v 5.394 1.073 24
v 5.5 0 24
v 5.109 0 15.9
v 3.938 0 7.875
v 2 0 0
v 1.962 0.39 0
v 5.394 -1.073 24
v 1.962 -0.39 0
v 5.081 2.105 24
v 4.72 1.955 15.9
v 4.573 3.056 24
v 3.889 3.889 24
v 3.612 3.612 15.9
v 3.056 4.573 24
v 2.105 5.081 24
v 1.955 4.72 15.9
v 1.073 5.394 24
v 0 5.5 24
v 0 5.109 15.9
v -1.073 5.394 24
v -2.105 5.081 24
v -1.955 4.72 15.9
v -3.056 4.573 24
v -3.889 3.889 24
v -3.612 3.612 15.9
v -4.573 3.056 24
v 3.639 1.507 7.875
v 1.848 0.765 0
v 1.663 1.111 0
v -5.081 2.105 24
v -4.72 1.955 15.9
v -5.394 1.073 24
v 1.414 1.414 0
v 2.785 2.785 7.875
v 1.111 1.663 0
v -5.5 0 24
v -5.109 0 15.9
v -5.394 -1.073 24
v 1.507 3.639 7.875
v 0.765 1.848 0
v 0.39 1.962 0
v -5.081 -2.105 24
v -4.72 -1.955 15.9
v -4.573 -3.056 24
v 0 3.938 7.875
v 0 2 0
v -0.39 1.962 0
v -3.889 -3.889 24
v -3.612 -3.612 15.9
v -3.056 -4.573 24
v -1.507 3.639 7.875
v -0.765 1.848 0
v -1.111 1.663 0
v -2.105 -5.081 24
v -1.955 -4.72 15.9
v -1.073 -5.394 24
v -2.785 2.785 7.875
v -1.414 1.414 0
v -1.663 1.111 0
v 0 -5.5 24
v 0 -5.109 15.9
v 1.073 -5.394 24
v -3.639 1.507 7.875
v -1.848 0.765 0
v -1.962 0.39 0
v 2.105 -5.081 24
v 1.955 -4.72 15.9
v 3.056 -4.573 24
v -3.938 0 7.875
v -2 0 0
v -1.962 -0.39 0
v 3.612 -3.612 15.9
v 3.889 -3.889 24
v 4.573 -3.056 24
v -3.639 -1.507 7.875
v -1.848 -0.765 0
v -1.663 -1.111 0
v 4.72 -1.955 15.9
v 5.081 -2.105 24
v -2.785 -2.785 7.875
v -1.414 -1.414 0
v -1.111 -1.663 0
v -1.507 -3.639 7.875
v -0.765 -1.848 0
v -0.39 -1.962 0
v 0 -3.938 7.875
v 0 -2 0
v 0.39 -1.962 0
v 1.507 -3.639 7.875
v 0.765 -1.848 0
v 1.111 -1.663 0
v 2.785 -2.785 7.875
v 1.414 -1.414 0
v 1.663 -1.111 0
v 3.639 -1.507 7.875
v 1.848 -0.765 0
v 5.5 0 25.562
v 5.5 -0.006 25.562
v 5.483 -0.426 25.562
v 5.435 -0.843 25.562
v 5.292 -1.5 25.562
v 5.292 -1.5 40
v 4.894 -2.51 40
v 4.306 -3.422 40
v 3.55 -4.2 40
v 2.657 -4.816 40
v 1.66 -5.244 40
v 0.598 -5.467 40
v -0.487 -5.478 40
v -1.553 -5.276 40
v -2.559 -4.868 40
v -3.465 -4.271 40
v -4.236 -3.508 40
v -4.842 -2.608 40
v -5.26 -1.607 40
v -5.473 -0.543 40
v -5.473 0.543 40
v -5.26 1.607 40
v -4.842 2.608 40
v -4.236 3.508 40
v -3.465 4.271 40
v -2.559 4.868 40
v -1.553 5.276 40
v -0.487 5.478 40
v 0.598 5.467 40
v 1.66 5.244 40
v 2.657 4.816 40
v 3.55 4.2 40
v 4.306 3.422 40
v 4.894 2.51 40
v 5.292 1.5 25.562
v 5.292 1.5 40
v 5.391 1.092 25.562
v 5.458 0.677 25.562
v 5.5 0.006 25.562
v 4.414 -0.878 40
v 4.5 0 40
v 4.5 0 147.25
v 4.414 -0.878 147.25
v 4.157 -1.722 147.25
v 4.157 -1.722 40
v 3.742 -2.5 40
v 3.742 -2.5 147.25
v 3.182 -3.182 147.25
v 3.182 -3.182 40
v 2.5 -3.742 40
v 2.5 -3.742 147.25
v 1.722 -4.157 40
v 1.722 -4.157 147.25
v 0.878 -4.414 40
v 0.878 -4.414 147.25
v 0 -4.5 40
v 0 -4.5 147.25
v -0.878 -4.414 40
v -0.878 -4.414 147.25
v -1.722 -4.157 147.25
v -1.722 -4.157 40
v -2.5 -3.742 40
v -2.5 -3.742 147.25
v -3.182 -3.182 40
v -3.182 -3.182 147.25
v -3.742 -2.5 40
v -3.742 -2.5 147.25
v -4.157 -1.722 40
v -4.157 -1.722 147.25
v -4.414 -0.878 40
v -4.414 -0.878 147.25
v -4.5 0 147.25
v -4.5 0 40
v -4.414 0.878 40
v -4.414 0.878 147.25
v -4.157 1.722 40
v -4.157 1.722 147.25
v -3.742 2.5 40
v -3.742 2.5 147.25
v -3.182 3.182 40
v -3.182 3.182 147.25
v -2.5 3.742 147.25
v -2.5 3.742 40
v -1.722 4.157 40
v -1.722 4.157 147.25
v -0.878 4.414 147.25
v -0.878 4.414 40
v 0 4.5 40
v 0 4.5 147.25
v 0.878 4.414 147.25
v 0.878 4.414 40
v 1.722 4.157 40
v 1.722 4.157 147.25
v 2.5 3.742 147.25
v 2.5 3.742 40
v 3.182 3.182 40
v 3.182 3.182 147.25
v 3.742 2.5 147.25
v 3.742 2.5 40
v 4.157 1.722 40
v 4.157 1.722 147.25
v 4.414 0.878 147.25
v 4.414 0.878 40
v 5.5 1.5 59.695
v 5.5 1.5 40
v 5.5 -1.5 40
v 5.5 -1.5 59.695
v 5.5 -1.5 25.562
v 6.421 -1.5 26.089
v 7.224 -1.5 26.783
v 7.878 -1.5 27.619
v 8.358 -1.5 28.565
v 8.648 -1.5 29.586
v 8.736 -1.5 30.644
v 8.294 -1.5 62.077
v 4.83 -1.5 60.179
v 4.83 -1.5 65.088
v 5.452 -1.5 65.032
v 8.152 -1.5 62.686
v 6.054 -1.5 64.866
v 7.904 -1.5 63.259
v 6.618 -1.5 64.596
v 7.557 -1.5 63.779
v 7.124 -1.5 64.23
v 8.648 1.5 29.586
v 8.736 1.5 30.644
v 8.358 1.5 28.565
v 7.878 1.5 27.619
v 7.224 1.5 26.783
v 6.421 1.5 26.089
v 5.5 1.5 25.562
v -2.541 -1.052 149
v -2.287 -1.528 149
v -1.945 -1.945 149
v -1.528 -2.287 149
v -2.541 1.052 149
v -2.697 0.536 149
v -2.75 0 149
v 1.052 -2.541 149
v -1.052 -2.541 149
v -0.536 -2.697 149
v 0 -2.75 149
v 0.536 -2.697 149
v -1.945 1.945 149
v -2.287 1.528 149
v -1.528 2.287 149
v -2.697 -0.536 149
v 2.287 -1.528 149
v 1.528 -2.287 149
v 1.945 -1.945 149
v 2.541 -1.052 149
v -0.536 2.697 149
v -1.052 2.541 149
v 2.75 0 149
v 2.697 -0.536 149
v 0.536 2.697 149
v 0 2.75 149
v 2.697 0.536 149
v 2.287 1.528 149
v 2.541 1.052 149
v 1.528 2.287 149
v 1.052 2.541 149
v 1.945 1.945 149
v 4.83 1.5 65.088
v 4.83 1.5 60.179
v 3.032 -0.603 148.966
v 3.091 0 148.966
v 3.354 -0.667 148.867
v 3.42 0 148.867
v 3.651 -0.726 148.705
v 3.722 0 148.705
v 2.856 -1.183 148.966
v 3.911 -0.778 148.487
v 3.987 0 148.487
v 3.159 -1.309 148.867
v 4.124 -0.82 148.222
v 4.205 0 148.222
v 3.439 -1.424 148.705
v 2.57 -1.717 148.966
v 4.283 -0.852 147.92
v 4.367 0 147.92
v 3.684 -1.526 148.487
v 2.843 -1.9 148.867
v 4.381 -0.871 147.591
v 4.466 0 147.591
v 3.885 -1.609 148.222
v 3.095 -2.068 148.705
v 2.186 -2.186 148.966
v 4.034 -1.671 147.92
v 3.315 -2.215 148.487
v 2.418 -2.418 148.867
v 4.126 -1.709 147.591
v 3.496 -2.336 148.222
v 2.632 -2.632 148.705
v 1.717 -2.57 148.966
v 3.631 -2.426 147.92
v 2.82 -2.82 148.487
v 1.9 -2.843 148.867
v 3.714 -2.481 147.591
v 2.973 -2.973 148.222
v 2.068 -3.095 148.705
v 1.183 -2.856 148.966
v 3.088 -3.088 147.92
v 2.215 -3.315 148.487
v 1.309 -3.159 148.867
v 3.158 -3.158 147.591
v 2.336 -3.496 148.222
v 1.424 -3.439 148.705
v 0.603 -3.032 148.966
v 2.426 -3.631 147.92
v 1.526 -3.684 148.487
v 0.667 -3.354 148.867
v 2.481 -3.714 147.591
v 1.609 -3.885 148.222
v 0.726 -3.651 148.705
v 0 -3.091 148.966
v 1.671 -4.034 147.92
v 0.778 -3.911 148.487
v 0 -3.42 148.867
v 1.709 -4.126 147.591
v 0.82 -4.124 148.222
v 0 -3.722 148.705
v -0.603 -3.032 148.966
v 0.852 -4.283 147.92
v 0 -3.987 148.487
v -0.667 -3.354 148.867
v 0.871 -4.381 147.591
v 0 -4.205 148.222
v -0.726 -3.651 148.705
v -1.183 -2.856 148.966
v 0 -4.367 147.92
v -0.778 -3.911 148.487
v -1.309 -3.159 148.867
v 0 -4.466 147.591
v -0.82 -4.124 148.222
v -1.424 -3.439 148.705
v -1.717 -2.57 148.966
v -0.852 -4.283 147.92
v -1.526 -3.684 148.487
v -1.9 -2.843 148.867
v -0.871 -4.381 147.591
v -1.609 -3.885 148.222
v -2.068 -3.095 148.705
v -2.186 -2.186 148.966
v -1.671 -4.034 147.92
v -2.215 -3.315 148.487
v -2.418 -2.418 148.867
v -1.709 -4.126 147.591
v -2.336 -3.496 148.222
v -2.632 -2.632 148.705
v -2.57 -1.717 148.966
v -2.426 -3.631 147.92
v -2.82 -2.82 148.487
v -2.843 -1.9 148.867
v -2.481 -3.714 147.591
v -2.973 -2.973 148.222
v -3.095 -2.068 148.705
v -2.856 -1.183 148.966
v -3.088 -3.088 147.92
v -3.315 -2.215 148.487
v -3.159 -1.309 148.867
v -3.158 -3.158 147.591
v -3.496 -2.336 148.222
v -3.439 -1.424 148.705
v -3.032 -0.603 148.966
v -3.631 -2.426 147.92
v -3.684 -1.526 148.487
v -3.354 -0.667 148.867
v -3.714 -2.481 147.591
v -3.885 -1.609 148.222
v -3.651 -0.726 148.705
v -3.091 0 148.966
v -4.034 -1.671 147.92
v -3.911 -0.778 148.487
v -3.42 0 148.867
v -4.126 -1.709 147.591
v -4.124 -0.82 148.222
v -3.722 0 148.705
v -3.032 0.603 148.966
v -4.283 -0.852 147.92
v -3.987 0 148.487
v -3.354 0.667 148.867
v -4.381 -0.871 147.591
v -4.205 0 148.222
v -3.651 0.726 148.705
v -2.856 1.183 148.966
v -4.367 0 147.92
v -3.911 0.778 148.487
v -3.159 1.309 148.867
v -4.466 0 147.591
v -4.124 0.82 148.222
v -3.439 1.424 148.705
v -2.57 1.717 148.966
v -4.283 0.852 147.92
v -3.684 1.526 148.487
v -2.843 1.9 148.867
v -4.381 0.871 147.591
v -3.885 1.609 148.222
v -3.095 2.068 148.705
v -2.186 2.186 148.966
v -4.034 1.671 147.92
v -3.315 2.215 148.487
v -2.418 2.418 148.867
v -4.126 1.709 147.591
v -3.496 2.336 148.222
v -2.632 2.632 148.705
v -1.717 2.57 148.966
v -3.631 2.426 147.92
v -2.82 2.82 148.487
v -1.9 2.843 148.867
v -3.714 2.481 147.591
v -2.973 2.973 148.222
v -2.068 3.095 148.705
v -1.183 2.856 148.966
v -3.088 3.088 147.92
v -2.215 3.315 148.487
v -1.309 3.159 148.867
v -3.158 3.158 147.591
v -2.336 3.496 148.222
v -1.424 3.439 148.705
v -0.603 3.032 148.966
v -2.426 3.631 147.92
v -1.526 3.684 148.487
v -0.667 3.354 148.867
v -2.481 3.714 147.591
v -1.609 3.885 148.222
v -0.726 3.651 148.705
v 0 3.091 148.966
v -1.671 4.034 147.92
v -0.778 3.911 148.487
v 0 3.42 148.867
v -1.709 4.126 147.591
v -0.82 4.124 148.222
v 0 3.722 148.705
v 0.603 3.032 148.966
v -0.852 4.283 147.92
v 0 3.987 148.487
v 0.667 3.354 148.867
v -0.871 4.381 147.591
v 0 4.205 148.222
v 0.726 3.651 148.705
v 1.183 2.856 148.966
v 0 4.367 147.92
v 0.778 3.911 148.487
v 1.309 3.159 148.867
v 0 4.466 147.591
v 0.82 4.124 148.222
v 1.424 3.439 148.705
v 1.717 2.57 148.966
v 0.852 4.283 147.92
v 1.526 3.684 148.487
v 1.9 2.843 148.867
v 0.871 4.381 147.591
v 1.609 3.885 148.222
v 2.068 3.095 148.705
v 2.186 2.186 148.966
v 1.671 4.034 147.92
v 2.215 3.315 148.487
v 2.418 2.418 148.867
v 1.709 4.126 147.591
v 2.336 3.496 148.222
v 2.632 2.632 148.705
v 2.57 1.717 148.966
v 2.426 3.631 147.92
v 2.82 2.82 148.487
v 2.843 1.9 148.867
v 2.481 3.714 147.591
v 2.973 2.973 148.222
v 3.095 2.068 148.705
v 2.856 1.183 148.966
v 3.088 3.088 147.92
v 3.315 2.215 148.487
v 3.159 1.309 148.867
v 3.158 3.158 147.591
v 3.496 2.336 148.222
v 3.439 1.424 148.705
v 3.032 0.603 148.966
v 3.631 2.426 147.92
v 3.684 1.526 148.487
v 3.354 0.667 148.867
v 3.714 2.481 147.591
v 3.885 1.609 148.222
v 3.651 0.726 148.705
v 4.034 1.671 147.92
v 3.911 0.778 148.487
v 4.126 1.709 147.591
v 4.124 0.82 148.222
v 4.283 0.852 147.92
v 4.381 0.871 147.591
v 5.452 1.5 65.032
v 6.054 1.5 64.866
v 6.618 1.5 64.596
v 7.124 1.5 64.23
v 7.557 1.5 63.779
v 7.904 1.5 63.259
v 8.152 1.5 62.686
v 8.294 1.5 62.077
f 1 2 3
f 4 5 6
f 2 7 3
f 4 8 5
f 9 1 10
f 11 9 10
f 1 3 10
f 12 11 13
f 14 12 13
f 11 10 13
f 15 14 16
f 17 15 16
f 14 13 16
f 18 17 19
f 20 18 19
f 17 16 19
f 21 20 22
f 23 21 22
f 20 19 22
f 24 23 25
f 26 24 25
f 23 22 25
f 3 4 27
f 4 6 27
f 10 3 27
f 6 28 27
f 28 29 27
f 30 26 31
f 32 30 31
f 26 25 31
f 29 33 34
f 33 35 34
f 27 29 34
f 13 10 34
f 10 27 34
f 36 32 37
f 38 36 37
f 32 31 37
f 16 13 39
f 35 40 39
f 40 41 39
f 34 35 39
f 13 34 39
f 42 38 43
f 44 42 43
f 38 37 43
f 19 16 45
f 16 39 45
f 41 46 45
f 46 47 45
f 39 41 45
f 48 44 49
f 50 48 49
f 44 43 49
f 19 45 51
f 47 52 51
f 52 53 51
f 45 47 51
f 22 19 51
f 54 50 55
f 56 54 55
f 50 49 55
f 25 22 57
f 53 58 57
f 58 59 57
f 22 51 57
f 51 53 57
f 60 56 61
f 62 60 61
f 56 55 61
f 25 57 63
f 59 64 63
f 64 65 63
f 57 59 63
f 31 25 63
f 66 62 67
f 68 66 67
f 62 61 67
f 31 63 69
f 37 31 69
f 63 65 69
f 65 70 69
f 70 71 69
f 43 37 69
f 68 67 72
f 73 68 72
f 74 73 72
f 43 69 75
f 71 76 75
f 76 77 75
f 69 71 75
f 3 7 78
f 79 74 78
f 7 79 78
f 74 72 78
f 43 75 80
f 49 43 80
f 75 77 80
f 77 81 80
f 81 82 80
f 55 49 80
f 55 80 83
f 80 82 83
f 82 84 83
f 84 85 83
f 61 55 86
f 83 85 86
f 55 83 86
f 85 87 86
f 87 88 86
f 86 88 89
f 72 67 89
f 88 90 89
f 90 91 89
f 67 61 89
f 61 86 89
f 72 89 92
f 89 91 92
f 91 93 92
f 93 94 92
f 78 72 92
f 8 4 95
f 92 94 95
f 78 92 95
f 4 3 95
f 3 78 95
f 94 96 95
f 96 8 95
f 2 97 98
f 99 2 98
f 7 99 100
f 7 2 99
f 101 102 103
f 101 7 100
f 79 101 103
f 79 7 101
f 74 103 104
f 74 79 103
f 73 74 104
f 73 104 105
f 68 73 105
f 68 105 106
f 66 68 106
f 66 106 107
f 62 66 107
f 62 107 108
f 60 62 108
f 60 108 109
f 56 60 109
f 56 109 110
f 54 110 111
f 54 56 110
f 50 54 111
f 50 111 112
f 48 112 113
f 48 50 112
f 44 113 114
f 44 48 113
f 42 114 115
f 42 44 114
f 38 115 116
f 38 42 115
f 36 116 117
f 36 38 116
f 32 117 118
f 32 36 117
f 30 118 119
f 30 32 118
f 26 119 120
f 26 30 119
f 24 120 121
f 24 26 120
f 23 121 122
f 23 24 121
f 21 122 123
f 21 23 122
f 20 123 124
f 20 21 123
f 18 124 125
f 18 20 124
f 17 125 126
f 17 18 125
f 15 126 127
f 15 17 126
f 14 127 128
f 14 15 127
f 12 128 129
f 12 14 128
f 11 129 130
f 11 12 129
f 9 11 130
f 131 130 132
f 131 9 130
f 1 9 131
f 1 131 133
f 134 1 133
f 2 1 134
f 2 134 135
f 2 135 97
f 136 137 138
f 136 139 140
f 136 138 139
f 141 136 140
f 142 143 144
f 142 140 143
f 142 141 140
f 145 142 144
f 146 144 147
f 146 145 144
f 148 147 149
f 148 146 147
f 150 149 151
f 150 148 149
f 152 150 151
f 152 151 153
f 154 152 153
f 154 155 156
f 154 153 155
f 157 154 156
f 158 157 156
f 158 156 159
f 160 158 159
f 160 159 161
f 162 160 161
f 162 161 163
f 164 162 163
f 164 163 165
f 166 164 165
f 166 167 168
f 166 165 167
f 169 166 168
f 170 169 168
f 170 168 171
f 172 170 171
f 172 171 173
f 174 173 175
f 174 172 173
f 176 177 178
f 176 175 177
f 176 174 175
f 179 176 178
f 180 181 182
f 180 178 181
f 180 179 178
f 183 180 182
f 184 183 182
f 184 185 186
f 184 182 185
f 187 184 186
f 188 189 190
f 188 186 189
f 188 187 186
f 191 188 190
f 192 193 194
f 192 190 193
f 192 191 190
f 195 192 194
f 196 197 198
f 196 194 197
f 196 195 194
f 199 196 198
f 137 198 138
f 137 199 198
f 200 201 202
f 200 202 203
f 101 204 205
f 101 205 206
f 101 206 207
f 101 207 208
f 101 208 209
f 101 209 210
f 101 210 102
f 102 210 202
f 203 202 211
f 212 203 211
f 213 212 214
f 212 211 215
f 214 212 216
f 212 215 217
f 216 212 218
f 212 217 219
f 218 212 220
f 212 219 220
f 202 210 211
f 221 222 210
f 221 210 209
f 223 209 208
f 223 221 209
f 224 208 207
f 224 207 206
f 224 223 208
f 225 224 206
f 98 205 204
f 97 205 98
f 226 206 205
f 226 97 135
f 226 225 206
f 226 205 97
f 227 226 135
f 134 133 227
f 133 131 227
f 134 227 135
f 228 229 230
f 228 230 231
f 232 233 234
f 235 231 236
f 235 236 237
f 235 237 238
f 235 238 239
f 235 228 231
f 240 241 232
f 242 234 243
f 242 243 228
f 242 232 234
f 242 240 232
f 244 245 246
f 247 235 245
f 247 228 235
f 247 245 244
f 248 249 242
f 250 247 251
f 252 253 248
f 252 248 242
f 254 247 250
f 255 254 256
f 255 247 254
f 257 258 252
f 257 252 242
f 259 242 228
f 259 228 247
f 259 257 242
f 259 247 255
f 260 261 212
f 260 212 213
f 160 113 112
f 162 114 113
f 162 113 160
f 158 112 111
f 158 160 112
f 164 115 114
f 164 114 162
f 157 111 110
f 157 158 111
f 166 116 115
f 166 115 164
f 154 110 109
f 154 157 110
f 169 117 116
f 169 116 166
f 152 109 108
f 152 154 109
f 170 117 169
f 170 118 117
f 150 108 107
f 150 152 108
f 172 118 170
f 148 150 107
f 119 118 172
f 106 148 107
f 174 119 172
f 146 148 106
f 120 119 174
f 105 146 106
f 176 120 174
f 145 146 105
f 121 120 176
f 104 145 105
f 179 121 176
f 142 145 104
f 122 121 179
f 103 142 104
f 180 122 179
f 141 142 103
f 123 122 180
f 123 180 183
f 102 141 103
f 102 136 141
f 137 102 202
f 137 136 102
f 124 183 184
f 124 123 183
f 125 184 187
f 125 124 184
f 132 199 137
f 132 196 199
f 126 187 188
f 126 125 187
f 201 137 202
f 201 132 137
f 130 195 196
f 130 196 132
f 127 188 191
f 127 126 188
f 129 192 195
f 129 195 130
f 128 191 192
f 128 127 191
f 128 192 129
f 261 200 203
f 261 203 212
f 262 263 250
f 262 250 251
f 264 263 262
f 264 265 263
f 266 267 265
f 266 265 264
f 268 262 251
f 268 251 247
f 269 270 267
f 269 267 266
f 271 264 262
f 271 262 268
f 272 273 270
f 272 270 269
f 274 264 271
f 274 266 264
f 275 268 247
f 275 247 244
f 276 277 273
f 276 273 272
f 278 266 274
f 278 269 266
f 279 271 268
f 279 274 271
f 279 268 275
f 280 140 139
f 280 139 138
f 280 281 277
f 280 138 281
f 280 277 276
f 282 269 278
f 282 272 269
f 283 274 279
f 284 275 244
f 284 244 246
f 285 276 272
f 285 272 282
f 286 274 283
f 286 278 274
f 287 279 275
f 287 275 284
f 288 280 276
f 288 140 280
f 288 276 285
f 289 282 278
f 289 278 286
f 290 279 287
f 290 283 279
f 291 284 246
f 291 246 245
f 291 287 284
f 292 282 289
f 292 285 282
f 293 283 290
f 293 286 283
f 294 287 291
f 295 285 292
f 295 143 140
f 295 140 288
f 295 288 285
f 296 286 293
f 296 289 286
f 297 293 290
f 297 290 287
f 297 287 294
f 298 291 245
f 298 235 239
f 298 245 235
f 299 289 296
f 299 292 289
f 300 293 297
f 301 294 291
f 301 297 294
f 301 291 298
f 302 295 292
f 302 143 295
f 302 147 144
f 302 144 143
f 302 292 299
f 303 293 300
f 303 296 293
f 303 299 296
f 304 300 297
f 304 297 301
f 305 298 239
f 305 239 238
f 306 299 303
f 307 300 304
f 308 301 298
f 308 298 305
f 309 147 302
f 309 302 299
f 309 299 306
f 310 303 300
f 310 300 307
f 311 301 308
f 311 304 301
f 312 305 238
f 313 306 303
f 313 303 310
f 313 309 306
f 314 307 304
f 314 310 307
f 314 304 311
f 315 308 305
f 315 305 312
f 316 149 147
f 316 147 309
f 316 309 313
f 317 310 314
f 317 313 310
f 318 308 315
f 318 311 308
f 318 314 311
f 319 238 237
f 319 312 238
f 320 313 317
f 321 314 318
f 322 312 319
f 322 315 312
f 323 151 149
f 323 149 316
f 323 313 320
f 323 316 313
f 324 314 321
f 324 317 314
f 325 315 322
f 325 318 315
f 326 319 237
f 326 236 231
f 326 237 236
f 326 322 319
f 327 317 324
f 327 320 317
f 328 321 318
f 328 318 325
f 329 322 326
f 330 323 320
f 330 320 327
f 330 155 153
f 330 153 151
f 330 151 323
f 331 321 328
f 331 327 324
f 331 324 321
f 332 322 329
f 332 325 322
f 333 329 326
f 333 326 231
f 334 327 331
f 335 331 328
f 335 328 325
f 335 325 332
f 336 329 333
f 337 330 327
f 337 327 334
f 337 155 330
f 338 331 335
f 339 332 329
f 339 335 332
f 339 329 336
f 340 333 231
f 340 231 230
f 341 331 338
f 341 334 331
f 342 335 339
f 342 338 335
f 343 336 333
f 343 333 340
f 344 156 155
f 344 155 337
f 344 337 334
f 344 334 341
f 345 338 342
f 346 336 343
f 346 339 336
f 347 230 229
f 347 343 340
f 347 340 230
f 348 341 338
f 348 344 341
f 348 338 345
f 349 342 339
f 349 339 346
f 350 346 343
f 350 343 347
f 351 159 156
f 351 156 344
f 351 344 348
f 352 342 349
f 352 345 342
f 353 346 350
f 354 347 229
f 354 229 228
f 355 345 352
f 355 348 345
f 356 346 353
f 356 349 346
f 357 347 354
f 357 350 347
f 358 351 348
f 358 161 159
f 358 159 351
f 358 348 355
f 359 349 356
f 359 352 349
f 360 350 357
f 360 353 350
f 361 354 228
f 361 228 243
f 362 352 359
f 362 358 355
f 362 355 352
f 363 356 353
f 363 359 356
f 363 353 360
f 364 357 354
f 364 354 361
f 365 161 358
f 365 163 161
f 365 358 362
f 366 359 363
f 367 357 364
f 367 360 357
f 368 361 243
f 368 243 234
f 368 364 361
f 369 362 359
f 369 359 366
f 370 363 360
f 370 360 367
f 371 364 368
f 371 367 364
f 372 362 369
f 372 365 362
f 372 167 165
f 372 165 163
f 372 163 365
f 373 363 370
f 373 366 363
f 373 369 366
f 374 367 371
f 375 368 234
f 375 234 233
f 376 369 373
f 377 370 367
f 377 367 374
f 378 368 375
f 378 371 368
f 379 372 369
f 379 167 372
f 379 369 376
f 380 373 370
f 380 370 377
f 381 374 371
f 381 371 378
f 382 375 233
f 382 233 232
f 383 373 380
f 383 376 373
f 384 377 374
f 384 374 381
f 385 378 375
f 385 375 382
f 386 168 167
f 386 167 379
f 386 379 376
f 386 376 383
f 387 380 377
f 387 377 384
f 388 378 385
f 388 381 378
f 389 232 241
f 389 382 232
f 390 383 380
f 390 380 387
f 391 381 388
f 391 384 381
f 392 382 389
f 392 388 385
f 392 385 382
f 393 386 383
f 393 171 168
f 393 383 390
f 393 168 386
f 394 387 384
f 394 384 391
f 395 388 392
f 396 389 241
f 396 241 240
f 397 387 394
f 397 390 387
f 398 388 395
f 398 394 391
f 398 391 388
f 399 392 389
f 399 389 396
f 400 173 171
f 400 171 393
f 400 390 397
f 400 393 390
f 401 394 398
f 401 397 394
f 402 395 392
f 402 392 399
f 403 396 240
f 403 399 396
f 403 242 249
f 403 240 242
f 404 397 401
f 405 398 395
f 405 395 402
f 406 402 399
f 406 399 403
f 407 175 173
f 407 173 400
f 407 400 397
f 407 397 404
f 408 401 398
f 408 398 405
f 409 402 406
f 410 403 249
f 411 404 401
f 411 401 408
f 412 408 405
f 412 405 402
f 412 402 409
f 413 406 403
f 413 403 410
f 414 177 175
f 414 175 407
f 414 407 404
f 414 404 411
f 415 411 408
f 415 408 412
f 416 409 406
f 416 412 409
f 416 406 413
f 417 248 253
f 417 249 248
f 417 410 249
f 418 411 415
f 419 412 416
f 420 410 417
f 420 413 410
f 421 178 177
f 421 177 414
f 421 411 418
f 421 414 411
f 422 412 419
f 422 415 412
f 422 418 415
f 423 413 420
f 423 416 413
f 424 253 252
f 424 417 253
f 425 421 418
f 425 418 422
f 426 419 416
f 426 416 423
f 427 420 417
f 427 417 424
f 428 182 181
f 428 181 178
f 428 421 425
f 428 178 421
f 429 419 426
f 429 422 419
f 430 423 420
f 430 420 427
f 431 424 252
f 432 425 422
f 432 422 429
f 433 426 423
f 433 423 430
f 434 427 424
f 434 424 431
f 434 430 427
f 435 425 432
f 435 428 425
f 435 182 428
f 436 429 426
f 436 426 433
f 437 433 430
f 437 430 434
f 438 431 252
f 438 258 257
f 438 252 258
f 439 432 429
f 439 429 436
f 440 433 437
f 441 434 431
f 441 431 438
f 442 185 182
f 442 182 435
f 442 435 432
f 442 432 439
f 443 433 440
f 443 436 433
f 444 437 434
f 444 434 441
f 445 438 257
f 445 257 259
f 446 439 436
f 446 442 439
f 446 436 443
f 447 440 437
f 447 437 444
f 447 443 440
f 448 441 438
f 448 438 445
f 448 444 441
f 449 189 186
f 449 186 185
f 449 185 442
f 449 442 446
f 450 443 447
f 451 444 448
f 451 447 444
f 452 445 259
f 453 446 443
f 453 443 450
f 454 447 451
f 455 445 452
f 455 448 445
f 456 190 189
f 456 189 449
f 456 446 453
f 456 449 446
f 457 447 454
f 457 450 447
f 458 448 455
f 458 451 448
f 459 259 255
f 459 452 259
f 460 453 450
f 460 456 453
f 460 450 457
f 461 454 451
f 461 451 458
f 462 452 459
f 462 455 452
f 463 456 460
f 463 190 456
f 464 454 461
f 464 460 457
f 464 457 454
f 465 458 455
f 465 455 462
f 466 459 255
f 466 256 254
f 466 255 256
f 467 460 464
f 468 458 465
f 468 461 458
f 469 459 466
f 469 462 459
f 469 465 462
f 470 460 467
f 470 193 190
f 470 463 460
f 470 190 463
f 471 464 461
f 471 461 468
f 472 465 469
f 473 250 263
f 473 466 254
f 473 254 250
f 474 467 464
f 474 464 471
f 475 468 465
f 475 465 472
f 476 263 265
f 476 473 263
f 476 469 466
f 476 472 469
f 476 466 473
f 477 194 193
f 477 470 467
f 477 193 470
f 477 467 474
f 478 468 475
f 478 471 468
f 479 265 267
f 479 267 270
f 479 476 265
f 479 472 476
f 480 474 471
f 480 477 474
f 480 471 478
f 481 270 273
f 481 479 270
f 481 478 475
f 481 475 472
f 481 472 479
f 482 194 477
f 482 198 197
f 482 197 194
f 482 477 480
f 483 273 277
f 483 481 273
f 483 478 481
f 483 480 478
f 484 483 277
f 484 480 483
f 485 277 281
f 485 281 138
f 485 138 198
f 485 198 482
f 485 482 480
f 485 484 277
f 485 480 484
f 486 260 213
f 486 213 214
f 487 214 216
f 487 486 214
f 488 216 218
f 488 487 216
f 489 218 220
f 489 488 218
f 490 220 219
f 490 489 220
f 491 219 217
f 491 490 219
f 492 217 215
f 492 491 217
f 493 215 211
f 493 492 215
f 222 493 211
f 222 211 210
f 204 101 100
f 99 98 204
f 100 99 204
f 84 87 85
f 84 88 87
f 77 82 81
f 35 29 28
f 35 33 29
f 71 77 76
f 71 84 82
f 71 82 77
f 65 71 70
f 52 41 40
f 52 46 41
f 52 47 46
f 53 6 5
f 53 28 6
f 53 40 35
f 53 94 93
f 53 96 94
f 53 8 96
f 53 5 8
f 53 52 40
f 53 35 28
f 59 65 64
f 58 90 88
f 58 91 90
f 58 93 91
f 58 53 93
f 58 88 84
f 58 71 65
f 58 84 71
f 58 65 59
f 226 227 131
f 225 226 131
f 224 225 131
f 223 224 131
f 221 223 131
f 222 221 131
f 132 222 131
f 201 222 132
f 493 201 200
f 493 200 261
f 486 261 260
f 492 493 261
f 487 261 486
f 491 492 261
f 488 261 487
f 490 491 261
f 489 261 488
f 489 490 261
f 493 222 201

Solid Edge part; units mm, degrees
sketch "Sketch1" plane through (0, 0, 0) normal (0, -1, 0) x (1, 0, 0)
  line L0 (0, 149) -> (4.5, 149)
  line L1 (4.5, 149) -> (4.5, 40)
  line L2 (4.5, 40) -> (5.5, 40)
  line L3 (5.5, 40) -> (5.5, 24)
  arc A0 (5.5, 24) -> (2, 0) centre (-78.5357, 24) cw
  line L4 (2, 0) -> (0, 0)
  dimension "D1" = 149
  dimension "D2" = 4.5
  dimension "D3" = 1
  dimension "D4" = 16
  dimension "D5" = 40
  dimension "D6" = 2
revolve "RevolvedProtrusion1" add sketch "Sketch1" angle 360 about axis through (0, 0, 0) along (0, 0, 1)
sketch "Sketch2" plane through (0, 0, 0) normal (0, -1, 0) x (1, 0, 0)
  line L0 (5.5, 40) -> (5.5, 59.6951)
  line L1 (5.5, 59.6951) -> (4.8296, 60.1792)
  line L2 (4.8296, 60.1792) -> (4.8296, 65.0875)
  arc A0 (4.8296, 65.0875) -> (8.2936, 62.077) centre (4.8296, 61.5894) cw
  line L3 (8.2936, 62.077) -> (8.7357, 30.6437)
  arc A1 (8.7357, 30.6437) -> (5.5, 25.5622) centre (3.249, 30.5665) cw
  line L4 (3.5, 25.5622) -> (5.5, 25.5622)
  line L5 (3.5, 40) -> (3.5, 25.5622)
  line L6 (5.5, 40) -> (3.5, 40)
  dimension "D1" = 2
extrude "Protrusion1" add sketch "Sketch2" along normal mid plane 3
fillet "Round_1" radius 1.75 1 edges at (-4.5, 0, 149)
